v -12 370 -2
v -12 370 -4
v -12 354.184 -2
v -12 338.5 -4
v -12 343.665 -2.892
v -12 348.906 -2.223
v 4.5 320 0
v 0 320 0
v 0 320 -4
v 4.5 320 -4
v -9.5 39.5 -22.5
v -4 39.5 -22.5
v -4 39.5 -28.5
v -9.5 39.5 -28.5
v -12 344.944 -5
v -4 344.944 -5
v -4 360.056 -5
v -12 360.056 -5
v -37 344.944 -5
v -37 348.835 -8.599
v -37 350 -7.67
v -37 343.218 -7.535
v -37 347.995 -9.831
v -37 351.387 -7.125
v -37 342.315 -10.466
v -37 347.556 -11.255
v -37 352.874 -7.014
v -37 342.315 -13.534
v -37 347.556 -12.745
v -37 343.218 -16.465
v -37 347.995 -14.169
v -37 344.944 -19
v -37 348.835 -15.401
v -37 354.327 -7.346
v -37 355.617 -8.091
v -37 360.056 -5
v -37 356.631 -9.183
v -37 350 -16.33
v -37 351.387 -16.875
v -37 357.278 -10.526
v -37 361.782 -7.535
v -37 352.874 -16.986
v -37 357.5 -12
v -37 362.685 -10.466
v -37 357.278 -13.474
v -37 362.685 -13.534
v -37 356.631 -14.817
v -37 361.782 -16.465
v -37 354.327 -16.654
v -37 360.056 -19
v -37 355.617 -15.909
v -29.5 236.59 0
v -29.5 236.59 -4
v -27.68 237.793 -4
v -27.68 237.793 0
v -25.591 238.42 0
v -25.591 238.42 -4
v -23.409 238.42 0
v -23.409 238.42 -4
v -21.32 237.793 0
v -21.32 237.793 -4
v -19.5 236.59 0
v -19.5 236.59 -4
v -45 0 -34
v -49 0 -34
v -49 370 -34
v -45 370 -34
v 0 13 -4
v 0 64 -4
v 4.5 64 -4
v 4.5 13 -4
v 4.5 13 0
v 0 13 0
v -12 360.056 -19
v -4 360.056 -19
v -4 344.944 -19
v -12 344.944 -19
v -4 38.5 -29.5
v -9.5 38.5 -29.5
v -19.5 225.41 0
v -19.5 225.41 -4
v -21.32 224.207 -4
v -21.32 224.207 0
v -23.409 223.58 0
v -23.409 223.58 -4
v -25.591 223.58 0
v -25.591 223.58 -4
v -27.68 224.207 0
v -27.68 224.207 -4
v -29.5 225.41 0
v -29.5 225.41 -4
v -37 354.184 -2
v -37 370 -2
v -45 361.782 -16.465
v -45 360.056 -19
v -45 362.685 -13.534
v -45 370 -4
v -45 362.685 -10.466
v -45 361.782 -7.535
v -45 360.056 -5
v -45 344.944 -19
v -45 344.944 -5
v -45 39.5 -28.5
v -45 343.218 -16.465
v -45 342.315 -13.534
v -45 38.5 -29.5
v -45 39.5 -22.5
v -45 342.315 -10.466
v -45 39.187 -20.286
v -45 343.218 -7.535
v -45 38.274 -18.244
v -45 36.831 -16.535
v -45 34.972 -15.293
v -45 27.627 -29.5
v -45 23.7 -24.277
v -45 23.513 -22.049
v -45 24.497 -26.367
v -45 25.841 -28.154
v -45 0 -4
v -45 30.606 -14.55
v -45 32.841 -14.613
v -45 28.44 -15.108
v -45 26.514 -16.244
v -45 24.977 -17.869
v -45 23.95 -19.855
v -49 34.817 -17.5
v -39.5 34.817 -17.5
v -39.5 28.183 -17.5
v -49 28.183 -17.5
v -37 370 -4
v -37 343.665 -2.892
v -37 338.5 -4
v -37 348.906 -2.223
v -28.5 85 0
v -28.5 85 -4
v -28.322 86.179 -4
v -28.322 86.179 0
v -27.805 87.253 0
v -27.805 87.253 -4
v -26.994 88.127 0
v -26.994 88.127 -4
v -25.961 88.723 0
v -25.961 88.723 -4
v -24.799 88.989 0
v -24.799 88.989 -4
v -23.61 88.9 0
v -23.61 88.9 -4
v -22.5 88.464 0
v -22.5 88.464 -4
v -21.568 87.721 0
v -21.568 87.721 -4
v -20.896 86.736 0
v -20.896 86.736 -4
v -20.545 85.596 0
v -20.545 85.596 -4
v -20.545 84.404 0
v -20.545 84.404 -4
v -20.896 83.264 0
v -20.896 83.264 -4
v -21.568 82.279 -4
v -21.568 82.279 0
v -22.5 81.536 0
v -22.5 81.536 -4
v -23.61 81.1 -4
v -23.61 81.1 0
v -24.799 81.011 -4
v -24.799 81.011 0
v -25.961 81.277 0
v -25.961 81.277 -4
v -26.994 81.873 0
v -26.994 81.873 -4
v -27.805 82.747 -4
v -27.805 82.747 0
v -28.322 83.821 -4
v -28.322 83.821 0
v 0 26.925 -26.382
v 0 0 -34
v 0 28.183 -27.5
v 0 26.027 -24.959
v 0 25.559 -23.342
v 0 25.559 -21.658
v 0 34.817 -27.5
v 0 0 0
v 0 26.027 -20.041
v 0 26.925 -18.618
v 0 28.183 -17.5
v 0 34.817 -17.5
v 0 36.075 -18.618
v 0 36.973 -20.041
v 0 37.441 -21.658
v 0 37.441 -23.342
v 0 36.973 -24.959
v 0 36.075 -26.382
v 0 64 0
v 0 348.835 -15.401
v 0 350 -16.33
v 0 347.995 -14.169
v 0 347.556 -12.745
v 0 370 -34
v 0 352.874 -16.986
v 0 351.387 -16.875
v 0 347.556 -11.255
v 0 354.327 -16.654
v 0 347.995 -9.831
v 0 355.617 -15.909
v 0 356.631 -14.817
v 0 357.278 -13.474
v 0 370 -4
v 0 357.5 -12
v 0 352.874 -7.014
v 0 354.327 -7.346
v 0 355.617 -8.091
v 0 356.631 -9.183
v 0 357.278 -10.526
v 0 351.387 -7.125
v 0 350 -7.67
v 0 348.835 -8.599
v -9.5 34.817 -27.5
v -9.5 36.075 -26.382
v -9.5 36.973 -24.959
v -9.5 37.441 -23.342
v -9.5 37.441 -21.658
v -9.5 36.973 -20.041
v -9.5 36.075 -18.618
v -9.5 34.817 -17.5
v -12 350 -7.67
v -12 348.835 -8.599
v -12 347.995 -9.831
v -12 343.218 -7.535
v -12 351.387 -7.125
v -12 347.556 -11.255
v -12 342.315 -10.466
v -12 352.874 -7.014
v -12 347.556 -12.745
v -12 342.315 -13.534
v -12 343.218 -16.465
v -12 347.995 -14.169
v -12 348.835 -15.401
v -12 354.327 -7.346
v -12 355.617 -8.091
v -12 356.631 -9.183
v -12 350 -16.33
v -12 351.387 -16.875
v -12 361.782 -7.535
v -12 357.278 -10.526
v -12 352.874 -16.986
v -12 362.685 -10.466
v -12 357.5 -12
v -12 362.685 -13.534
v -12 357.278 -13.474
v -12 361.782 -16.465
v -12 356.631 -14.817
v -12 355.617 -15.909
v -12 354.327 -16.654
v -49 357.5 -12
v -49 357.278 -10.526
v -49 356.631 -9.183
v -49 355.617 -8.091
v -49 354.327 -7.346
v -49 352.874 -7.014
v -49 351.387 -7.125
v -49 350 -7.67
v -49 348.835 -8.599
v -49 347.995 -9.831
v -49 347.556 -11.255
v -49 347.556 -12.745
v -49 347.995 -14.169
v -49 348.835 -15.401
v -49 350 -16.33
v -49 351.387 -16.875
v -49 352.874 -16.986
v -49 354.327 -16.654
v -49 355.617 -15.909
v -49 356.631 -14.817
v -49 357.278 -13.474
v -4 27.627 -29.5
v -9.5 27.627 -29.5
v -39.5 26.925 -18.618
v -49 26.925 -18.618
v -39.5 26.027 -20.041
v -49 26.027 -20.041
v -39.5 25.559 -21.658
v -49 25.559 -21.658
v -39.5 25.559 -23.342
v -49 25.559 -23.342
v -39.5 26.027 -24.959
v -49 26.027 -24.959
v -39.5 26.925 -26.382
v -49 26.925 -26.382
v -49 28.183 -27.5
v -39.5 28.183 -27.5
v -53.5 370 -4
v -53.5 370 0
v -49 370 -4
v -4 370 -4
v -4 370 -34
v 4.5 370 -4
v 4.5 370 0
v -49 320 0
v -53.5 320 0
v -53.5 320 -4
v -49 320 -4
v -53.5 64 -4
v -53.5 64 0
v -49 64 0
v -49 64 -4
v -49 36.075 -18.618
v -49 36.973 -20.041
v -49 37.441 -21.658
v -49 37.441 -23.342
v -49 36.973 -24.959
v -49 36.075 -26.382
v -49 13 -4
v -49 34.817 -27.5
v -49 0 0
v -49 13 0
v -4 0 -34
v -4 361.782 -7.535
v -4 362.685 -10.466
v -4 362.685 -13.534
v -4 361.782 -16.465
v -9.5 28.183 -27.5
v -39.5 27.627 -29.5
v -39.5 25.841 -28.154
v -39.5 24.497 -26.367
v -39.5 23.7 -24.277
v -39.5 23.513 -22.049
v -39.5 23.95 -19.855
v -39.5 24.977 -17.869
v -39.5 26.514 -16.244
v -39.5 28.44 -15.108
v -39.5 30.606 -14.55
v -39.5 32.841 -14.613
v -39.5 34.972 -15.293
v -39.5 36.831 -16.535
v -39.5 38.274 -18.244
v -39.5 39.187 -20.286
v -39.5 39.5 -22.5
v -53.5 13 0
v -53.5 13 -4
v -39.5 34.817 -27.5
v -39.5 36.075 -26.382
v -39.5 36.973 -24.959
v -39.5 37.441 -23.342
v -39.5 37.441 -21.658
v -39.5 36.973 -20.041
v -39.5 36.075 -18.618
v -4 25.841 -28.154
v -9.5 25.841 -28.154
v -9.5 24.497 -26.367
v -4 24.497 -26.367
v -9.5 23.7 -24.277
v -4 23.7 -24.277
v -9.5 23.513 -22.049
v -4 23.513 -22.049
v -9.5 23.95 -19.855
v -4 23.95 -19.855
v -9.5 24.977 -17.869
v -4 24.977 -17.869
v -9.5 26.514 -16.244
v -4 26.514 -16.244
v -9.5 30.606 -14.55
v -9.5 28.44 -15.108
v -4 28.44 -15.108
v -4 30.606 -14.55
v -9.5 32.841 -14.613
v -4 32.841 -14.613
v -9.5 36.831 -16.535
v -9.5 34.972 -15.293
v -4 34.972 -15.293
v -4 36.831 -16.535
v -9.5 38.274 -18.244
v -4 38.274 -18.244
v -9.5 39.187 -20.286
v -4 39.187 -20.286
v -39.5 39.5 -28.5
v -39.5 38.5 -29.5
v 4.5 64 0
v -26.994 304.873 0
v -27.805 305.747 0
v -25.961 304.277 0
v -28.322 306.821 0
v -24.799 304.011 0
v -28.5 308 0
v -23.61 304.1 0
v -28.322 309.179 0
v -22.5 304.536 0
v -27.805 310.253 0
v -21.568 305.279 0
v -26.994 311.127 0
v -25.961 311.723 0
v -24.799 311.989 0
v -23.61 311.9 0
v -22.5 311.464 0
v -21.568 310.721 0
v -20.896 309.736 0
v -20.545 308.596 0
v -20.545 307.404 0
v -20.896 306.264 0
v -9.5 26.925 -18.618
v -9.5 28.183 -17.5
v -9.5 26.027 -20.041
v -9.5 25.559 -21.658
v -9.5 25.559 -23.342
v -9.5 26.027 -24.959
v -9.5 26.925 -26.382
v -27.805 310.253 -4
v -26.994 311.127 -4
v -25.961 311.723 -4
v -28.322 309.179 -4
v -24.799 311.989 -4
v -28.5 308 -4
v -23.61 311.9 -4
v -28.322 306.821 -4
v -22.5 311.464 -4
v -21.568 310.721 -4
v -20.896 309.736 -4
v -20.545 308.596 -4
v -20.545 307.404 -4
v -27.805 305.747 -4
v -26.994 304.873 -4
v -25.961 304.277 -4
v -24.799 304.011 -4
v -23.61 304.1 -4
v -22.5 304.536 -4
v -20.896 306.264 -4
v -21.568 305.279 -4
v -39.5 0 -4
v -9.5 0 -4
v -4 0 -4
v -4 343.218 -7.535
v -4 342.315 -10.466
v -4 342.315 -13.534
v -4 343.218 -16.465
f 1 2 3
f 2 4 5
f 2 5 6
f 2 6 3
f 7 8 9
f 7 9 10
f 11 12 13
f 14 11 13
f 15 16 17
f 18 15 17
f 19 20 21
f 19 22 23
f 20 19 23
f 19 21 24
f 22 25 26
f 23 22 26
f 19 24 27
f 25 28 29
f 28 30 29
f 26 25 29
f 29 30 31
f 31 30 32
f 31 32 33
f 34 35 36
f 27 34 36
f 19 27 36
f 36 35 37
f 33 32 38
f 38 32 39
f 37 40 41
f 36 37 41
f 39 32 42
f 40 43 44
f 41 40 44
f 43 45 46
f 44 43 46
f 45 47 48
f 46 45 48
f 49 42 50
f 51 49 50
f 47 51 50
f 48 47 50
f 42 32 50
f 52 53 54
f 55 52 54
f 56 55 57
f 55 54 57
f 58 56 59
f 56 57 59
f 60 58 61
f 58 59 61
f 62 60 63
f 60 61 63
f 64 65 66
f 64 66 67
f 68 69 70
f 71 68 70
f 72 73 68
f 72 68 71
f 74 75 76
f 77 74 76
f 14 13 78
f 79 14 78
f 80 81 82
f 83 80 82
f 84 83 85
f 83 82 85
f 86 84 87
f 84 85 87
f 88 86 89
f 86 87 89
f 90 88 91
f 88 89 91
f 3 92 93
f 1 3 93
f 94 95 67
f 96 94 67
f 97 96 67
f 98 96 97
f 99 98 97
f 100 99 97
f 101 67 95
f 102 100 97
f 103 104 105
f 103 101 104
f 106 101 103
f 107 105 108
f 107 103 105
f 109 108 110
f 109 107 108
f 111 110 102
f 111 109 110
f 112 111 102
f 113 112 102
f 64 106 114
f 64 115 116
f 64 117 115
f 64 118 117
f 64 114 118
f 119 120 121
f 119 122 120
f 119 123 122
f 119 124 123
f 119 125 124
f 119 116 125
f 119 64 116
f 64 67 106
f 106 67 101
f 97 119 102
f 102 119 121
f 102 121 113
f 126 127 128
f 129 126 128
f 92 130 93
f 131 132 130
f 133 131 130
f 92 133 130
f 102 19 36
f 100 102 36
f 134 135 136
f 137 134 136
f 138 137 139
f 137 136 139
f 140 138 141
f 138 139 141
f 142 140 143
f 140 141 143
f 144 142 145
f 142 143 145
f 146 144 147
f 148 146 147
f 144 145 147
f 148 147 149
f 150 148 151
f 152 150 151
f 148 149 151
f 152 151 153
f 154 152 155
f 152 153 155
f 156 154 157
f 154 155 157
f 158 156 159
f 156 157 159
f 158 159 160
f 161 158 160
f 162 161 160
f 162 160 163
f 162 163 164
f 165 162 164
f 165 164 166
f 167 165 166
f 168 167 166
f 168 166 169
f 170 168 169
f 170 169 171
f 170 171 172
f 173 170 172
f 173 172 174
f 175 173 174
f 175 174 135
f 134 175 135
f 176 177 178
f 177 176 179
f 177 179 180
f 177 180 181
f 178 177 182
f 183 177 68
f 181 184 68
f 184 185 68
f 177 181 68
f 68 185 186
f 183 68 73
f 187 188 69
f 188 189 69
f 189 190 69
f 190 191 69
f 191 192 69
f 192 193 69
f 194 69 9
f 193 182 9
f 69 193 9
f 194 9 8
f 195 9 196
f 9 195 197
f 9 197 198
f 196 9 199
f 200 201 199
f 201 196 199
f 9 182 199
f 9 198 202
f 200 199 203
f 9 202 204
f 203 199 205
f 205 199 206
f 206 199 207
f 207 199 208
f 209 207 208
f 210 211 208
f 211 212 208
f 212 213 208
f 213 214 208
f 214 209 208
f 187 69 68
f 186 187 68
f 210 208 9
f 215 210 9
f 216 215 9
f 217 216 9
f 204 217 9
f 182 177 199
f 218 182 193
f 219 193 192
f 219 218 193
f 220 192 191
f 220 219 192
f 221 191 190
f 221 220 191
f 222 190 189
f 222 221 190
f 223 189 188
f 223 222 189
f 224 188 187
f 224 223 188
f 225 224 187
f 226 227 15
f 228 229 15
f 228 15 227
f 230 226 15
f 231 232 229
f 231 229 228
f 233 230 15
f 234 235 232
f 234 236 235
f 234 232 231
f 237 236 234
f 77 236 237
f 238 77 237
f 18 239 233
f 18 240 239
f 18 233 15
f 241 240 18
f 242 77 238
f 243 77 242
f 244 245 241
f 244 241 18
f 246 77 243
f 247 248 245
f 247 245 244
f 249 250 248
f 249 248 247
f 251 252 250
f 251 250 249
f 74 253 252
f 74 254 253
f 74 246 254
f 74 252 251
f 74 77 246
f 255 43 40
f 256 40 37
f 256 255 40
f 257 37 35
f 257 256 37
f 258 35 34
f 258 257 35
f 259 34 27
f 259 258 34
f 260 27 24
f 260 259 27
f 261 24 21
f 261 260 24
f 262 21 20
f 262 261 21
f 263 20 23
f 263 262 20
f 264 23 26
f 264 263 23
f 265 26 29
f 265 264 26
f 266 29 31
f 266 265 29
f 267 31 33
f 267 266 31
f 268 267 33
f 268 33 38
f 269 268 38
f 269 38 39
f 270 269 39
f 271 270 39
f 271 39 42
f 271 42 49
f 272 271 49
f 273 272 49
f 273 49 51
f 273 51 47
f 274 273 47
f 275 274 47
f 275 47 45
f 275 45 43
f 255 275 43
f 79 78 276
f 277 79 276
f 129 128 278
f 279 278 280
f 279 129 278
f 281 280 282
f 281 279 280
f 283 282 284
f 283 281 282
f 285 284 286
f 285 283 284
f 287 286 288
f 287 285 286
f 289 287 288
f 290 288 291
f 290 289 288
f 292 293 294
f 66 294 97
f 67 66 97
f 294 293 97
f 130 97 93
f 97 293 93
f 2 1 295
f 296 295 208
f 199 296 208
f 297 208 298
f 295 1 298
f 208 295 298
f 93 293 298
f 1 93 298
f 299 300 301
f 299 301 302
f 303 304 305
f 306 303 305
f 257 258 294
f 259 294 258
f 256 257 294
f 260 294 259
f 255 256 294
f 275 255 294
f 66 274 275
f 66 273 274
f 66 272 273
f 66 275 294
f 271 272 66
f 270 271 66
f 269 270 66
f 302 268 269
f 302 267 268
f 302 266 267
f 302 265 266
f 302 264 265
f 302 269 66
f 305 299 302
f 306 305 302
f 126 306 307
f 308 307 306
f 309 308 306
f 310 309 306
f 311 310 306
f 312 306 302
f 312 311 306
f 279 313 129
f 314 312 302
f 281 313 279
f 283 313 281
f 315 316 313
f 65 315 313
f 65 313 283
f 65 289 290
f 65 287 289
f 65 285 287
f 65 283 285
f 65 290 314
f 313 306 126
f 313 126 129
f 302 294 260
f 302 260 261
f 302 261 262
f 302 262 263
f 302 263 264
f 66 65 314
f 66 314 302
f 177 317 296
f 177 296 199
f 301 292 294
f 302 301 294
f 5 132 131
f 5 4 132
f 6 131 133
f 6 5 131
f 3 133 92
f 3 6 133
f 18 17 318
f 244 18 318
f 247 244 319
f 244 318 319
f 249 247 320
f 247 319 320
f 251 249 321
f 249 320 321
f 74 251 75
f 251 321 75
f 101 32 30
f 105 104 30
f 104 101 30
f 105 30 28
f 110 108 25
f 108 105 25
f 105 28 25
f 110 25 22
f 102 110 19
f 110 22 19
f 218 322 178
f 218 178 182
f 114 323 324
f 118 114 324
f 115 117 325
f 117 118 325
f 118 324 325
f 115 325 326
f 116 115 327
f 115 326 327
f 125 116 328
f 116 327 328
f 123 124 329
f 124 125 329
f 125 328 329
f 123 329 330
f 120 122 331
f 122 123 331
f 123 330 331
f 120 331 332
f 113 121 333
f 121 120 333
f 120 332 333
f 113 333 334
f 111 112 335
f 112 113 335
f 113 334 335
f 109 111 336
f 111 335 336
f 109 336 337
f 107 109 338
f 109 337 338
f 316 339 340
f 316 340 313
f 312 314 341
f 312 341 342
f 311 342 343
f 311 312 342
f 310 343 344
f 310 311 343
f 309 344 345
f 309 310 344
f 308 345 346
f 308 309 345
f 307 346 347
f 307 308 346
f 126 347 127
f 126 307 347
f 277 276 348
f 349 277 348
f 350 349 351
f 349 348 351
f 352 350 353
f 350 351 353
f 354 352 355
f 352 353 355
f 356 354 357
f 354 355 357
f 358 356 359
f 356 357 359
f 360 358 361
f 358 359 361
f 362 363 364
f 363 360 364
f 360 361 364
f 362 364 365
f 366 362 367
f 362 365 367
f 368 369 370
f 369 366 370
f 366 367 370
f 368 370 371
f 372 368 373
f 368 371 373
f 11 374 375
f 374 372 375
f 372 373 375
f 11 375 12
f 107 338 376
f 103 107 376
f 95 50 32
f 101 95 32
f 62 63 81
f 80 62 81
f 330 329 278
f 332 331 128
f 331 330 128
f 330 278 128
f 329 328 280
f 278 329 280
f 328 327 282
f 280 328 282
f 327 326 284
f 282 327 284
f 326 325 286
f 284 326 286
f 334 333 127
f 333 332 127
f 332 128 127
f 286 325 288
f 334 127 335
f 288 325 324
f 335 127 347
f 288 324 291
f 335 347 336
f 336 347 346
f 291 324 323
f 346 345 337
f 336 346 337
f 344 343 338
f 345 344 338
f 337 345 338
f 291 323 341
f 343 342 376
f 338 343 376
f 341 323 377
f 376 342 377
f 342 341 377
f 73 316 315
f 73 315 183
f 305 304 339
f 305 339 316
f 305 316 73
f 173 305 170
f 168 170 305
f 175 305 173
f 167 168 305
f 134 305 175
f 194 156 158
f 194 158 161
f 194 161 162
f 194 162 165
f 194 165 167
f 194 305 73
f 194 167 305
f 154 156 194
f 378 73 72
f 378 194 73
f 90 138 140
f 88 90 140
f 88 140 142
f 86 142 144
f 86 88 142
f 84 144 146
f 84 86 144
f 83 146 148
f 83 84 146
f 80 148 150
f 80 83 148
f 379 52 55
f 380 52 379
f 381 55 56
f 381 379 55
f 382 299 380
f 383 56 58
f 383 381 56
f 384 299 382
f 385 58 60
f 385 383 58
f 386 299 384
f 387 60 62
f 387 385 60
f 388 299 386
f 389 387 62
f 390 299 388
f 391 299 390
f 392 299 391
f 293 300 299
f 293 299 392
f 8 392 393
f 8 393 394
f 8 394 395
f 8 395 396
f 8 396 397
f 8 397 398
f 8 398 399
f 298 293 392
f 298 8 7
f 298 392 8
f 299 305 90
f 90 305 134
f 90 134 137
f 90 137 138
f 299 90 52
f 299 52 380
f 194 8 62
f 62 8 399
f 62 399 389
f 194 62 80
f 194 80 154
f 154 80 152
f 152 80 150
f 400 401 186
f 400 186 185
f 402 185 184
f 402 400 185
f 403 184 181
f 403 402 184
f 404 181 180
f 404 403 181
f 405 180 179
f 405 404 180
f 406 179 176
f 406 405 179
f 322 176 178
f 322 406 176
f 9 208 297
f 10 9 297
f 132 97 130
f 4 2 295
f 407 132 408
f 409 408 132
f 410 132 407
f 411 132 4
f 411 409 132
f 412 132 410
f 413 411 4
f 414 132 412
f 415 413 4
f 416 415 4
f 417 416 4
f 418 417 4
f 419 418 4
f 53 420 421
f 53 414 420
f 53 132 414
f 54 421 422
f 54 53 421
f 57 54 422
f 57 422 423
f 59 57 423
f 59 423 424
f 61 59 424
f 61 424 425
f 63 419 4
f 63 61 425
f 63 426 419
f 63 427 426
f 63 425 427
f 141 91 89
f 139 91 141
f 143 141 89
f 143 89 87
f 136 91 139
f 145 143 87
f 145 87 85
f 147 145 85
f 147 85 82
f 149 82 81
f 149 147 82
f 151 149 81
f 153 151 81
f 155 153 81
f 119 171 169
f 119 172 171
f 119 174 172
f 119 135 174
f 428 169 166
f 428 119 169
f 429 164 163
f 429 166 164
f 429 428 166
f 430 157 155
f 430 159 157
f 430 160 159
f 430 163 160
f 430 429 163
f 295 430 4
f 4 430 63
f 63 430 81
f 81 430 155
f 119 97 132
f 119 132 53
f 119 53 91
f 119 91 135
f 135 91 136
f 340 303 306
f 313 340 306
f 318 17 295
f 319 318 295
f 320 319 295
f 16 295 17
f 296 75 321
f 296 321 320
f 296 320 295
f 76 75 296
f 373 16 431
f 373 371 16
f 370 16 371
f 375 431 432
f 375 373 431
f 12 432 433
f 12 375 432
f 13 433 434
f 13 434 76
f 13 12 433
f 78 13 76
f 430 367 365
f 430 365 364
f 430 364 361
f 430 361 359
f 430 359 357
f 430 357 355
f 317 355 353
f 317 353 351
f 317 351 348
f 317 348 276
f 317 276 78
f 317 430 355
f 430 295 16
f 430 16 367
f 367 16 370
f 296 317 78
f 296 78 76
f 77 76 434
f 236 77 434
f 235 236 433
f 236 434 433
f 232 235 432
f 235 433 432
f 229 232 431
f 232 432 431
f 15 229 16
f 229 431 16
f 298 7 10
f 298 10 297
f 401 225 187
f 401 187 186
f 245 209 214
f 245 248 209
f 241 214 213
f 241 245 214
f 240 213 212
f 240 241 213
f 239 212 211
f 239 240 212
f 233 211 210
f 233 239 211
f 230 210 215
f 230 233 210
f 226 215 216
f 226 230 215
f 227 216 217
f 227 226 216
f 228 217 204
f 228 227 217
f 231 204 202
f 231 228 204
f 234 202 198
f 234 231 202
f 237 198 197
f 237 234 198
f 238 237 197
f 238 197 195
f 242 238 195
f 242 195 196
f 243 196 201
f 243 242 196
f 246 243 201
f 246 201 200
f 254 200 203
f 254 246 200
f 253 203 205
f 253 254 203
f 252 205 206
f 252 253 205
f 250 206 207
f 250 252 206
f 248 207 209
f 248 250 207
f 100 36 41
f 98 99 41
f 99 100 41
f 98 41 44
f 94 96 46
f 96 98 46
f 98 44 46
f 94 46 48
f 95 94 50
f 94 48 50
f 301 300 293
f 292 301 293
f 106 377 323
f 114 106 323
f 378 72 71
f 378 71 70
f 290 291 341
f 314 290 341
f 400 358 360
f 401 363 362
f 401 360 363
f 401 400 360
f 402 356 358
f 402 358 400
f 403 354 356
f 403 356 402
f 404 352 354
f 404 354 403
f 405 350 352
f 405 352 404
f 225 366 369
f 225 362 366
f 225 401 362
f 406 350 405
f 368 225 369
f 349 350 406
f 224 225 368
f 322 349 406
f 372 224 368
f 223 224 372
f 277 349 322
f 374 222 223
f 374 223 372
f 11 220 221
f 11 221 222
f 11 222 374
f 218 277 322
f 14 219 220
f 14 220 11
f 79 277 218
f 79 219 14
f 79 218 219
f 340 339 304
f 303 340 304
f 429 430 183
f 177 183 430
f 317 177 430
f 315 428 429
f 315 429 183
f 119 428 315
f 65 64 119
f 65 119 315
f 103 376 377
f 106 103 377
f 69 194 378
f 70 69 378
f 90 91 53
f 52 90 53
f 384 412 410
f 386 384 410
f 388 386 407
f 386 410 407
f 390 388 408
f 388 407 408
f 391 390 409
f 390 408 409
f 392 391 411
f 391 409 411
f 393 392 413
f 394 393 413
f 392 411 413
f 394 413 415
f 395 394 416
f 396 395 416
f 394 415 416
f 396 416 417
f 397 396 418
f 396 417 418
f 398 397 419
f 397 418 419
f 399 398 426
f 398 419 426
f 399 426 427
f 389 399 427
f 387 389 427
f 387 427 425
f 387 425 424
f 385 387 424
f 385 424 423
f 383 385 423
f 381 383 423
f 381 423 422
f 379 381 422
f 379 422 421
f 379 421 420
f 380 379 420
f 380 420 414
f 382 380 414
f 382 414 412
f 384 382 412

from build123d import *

# Parameters (mm, degrees)
BOSS_EXTRUDE1_DEPTH     = 370
SKETCH9_W               = 58
SKETCH9_H               = 50
SKETCH9_H_2             = 51
BOSS_EXTRUDE2_DEPTH     = 4
SKETCH14_R              = 5
BOSS_EXTRUDE3_DEPTH     = 49
CUT_EXTRUDE4_REACH      = 377.391
SKETCH15_W              = 25
SKETCH15_H              = 30
SKETCH15_W_2            = 30
SKETCH15_H_2            = 67.188472817
SKETCH16_R              = 4
CUT_EXTRUDE5_DEPTH      = 376.049663378
CUT_EXTRUDE6_DEPTH      = 376.049663378
CUT_EXTRUDE7_DEPTH      = 375.841633227
CUT_EXTRUDE7_DEPTH_BACK = 375.841633227
SKETCH18_R              = 5
CUT_EXTRUDE8_DEPTH      = 12.5


with BuildPart() as part:
    # Sketch3 → Boss-Extrude1 (new body)
    with BuildSketch(Plane(origin=(0, 0, 0), x_dir=(1, 0, 0), z_dir=(0, 1, 0))):
        Polygon((0, 0), (-49, 0), (-49, 34), (-45, 34), (-45, 4), (-4, 4), (-4, 34), (0, 34), align=None)
    extrude(amount=BOSS_EXTRUDE1_DEPTH)

    # Sketch9 → Boss-Extrude2 (add)
    with BuildSketch(Plane.XY):
        with Locations((-24.5, 345)):
            Rectangle(SKETCH9_W, SKETCH9_H)
        with Locations((-24.5, 38.5)):
            Rectangle(SKETCH9_W, SKETCH9_H_2)
    extrude(amount=-BOSS_EXTRUDE2_DEPTH)

    # Sketch14 → Boss-Extrude3 (add)
    # profile 1 of 2: a face of its own
    with BuildSketch(Plane(origin=(0, 0, 0), x_dir=(0, 0, -1), z_dir=(1, 0, 0))):
        with BuildLine():
            Line((19, 360.05579248), (19, 344.94420752))
            ThreePointArc((19, 344.94420752), (12, 342.2), (5, 344.94420752))
            Line((5, 344.94420752), (5, 360.05579248))
            ThreePointArc((5, 360.05579248), (12, 362.8), (19, 360.05579248))
        make_face()
        with Locations((12, 352.5)):
            Circle(SKETCH14_R, mode=Mode.SUBTRACT)
    # profile 2 of 2: a face of its own
    with BuildSketch(Plane(origin=(0, 0, 0), x_dir=(0, 0, -1), z_dir=(1, 0, 0))):
        with BuildLine():
            Line((29.5, 38.5), (29.5, 27.627016654))
            ThreePointArc((29.5, 27.627016654), (15.608560863, 27.436987987), (22.5, 39.5))
            Line((22.5, 39.5), (28.5, 39.5))
            Line((28.5, 39.5), (29.5, 38.5))
        make_face()
        with BuildLine():
            Line((27.5, 34.81662479), (27.5, 28.18337521))
            ThreePointArc((27.5, 28.18337521), (22.5, 25.5), (17.5, 28.18337521))
            Line((17.5, 28.18337521), (17.5, 34.81662479))
            ThreePointArc((17.5, 34.81662479), (22.5, 37.5), (27.5, 34.81662479))
        make_face(mode=Mode.SUBTRACT)
    extrude(amount=-BOSS_EXTRUDE3_DEPTH)

    # Cut-Extrude4: up to this face of the body (flat: up to its plane)
    cut_extrude4_end = Plane(part.part.faces().sort_by_distance((-24.5, 185, -4))[0])
    # Sketch15 → Cut-Extrude4 (cut, up to the picked face)
    with BuildSketch(Plane(origin=(0, 0, -34), x_dir=(-1, 0, 0), z_dir=(0, 0, -1)), mode=Mode.PRIVATE) as cut_extrude4_sk1:
        with Locations((24.5, 355)):
            Rectangle(SKETCH15_W, SKETCH15_H)
    cut_extrude4_tool1 = split(extrude(cut_extrude4_sk1.sketch, amount=-CUT_EXTRUDE4_REACH, mode=Mode.PRIVATE), bisect_by=cut_extrude4_end, keep=Keep.BOTH, mode=Mode.PRIVATE)
    # Sketch15 → Cut-Extrude4 (cut, up to the picked face)
    with BuildSketch(Plane(origin=(0, 0, -34), x_dir=(-1, 0, 0), z_dir=(0, 0, -1)), mode=Mode.PRIVATE) as cut_extrude4_sk2:
        with Locations((24.5, 33.594236409)):
            Rectangle(SKETCH15_W_2, SKETCH15_H_2)
    cut_extrude4_tool2 = split(extrude(cut_extrude4_sk2.sketch, amount=-CUT_EXTRUDE4_REACH, mode=Mode.PRIVATE), bisect_by=cut_extrude4_end, keep=Keep.BOTH, mode=Mode.PRIVATE)
    add(cut_extrude4_tool1.solids().sort_by(Axis((-24.5, 355, -34), (0, 0, 1)))[0], mode=Mode.SUBTRACT)
    add(cut_extrude4_tool2.solids().sort_by(Axis((-24.5, 33.594236, -34), (0, 0, 1)))[0], mode=Mode.SUBTRACT)

    # Sketch16 → Cut-Extrude5 (cut, through all)
    with BuildSketch(Plane(origin=(0, 0, -4), x_dir=(-1, 0, 0), z_dir=(0, 0, -1))):
        with Locations((24.5, 85)):
            Circle(SKETCH16_R)
        with Locations((24.5, 308)):
            Circle(SKETCH16_R)
    extrude(amount=-CUT_EXTRUDE5_DEPTH, mode=Mode.SUBTRACT)

    # Sketch17 → Cut-Extrude6 (cut, through all)
    with BuildSketch(Plane(origin=(0, 0, -4), x_dir=(-1, 0, 0), z_dir=(0, 0, -1))):
        with BuildLine():
            Line((19.5, 236.590169944), (19.5, 225.409830056))
            ThreePointArc((19.5, 225.409830056), (24.5, 223.5), (29.5, 225.409830056))
            Line((29.5, 225.409830056), (29.5, 236.590169944))
            ThreePointArc((29.5, 236.590169944), (24.5, 238.5), (19.5, 236.590169944))
        make_face()
    extrude(amount=-CUT_EXTRUDE6_DEPTH, mode=Mode.SUBTRACT)

    # Sketch18 → Cut-Extrude7 (cut, two sides: drawn at the far end of the back side and taken through both)
    with BuildSketch(Plane(origin=(-45, 0, 0), x_dir=(0, 0, -1), z_dir=(1, 0, 0)).offset(-CUT_EXTRUDE7_DEPTH_BACK)):
        with Locations(Location((12, 352.5, 0), (0, 0, 90))):
            Circle(SKETCH18_R)
        with BuildLine():
            Line((17.5, 34.81662479), (17.5, 28.18337521))
            ThreePointArc((17.5, 28.18337521), (22.5, 25.5), (27.5, 28.18337521))
            Line((27.5, 28.18337521), (27.5, 34.81662479))
            ThreePointArc((27.5, 34.81662479), (22.5, 37.5), (17.5, 34.81662479))
        make_face()
    extrude(amount=CUT_EXTRUDE7_DEPTH + CUT_EXTRUDE7_DEPTH_BACK, mode=Mode.SUBTRACT)

    # Sketch19 → Cut-Extrude8 (cut, symmetric)
    with BuildSketch(Plane(origin=(-24.5, 0, 0), x_dir=(0, 0, -1), z_dir=(1, 0, 0))):
        with BuildLine():
            Line((4, 370), (4, 338.5))
            ThreePointArc((4, 338.5), (2.502016162, 346.278692991), (2, 354.184387141))
            Line((2, 354.184387141), (2, 370))
            Line((2, 370), (4, 370))
        make_face()
    extrude(amount=CUT_EXTRUDE8_DEPTH, both=True, mode=Mode.SUBTRACT)


solid = part.part
